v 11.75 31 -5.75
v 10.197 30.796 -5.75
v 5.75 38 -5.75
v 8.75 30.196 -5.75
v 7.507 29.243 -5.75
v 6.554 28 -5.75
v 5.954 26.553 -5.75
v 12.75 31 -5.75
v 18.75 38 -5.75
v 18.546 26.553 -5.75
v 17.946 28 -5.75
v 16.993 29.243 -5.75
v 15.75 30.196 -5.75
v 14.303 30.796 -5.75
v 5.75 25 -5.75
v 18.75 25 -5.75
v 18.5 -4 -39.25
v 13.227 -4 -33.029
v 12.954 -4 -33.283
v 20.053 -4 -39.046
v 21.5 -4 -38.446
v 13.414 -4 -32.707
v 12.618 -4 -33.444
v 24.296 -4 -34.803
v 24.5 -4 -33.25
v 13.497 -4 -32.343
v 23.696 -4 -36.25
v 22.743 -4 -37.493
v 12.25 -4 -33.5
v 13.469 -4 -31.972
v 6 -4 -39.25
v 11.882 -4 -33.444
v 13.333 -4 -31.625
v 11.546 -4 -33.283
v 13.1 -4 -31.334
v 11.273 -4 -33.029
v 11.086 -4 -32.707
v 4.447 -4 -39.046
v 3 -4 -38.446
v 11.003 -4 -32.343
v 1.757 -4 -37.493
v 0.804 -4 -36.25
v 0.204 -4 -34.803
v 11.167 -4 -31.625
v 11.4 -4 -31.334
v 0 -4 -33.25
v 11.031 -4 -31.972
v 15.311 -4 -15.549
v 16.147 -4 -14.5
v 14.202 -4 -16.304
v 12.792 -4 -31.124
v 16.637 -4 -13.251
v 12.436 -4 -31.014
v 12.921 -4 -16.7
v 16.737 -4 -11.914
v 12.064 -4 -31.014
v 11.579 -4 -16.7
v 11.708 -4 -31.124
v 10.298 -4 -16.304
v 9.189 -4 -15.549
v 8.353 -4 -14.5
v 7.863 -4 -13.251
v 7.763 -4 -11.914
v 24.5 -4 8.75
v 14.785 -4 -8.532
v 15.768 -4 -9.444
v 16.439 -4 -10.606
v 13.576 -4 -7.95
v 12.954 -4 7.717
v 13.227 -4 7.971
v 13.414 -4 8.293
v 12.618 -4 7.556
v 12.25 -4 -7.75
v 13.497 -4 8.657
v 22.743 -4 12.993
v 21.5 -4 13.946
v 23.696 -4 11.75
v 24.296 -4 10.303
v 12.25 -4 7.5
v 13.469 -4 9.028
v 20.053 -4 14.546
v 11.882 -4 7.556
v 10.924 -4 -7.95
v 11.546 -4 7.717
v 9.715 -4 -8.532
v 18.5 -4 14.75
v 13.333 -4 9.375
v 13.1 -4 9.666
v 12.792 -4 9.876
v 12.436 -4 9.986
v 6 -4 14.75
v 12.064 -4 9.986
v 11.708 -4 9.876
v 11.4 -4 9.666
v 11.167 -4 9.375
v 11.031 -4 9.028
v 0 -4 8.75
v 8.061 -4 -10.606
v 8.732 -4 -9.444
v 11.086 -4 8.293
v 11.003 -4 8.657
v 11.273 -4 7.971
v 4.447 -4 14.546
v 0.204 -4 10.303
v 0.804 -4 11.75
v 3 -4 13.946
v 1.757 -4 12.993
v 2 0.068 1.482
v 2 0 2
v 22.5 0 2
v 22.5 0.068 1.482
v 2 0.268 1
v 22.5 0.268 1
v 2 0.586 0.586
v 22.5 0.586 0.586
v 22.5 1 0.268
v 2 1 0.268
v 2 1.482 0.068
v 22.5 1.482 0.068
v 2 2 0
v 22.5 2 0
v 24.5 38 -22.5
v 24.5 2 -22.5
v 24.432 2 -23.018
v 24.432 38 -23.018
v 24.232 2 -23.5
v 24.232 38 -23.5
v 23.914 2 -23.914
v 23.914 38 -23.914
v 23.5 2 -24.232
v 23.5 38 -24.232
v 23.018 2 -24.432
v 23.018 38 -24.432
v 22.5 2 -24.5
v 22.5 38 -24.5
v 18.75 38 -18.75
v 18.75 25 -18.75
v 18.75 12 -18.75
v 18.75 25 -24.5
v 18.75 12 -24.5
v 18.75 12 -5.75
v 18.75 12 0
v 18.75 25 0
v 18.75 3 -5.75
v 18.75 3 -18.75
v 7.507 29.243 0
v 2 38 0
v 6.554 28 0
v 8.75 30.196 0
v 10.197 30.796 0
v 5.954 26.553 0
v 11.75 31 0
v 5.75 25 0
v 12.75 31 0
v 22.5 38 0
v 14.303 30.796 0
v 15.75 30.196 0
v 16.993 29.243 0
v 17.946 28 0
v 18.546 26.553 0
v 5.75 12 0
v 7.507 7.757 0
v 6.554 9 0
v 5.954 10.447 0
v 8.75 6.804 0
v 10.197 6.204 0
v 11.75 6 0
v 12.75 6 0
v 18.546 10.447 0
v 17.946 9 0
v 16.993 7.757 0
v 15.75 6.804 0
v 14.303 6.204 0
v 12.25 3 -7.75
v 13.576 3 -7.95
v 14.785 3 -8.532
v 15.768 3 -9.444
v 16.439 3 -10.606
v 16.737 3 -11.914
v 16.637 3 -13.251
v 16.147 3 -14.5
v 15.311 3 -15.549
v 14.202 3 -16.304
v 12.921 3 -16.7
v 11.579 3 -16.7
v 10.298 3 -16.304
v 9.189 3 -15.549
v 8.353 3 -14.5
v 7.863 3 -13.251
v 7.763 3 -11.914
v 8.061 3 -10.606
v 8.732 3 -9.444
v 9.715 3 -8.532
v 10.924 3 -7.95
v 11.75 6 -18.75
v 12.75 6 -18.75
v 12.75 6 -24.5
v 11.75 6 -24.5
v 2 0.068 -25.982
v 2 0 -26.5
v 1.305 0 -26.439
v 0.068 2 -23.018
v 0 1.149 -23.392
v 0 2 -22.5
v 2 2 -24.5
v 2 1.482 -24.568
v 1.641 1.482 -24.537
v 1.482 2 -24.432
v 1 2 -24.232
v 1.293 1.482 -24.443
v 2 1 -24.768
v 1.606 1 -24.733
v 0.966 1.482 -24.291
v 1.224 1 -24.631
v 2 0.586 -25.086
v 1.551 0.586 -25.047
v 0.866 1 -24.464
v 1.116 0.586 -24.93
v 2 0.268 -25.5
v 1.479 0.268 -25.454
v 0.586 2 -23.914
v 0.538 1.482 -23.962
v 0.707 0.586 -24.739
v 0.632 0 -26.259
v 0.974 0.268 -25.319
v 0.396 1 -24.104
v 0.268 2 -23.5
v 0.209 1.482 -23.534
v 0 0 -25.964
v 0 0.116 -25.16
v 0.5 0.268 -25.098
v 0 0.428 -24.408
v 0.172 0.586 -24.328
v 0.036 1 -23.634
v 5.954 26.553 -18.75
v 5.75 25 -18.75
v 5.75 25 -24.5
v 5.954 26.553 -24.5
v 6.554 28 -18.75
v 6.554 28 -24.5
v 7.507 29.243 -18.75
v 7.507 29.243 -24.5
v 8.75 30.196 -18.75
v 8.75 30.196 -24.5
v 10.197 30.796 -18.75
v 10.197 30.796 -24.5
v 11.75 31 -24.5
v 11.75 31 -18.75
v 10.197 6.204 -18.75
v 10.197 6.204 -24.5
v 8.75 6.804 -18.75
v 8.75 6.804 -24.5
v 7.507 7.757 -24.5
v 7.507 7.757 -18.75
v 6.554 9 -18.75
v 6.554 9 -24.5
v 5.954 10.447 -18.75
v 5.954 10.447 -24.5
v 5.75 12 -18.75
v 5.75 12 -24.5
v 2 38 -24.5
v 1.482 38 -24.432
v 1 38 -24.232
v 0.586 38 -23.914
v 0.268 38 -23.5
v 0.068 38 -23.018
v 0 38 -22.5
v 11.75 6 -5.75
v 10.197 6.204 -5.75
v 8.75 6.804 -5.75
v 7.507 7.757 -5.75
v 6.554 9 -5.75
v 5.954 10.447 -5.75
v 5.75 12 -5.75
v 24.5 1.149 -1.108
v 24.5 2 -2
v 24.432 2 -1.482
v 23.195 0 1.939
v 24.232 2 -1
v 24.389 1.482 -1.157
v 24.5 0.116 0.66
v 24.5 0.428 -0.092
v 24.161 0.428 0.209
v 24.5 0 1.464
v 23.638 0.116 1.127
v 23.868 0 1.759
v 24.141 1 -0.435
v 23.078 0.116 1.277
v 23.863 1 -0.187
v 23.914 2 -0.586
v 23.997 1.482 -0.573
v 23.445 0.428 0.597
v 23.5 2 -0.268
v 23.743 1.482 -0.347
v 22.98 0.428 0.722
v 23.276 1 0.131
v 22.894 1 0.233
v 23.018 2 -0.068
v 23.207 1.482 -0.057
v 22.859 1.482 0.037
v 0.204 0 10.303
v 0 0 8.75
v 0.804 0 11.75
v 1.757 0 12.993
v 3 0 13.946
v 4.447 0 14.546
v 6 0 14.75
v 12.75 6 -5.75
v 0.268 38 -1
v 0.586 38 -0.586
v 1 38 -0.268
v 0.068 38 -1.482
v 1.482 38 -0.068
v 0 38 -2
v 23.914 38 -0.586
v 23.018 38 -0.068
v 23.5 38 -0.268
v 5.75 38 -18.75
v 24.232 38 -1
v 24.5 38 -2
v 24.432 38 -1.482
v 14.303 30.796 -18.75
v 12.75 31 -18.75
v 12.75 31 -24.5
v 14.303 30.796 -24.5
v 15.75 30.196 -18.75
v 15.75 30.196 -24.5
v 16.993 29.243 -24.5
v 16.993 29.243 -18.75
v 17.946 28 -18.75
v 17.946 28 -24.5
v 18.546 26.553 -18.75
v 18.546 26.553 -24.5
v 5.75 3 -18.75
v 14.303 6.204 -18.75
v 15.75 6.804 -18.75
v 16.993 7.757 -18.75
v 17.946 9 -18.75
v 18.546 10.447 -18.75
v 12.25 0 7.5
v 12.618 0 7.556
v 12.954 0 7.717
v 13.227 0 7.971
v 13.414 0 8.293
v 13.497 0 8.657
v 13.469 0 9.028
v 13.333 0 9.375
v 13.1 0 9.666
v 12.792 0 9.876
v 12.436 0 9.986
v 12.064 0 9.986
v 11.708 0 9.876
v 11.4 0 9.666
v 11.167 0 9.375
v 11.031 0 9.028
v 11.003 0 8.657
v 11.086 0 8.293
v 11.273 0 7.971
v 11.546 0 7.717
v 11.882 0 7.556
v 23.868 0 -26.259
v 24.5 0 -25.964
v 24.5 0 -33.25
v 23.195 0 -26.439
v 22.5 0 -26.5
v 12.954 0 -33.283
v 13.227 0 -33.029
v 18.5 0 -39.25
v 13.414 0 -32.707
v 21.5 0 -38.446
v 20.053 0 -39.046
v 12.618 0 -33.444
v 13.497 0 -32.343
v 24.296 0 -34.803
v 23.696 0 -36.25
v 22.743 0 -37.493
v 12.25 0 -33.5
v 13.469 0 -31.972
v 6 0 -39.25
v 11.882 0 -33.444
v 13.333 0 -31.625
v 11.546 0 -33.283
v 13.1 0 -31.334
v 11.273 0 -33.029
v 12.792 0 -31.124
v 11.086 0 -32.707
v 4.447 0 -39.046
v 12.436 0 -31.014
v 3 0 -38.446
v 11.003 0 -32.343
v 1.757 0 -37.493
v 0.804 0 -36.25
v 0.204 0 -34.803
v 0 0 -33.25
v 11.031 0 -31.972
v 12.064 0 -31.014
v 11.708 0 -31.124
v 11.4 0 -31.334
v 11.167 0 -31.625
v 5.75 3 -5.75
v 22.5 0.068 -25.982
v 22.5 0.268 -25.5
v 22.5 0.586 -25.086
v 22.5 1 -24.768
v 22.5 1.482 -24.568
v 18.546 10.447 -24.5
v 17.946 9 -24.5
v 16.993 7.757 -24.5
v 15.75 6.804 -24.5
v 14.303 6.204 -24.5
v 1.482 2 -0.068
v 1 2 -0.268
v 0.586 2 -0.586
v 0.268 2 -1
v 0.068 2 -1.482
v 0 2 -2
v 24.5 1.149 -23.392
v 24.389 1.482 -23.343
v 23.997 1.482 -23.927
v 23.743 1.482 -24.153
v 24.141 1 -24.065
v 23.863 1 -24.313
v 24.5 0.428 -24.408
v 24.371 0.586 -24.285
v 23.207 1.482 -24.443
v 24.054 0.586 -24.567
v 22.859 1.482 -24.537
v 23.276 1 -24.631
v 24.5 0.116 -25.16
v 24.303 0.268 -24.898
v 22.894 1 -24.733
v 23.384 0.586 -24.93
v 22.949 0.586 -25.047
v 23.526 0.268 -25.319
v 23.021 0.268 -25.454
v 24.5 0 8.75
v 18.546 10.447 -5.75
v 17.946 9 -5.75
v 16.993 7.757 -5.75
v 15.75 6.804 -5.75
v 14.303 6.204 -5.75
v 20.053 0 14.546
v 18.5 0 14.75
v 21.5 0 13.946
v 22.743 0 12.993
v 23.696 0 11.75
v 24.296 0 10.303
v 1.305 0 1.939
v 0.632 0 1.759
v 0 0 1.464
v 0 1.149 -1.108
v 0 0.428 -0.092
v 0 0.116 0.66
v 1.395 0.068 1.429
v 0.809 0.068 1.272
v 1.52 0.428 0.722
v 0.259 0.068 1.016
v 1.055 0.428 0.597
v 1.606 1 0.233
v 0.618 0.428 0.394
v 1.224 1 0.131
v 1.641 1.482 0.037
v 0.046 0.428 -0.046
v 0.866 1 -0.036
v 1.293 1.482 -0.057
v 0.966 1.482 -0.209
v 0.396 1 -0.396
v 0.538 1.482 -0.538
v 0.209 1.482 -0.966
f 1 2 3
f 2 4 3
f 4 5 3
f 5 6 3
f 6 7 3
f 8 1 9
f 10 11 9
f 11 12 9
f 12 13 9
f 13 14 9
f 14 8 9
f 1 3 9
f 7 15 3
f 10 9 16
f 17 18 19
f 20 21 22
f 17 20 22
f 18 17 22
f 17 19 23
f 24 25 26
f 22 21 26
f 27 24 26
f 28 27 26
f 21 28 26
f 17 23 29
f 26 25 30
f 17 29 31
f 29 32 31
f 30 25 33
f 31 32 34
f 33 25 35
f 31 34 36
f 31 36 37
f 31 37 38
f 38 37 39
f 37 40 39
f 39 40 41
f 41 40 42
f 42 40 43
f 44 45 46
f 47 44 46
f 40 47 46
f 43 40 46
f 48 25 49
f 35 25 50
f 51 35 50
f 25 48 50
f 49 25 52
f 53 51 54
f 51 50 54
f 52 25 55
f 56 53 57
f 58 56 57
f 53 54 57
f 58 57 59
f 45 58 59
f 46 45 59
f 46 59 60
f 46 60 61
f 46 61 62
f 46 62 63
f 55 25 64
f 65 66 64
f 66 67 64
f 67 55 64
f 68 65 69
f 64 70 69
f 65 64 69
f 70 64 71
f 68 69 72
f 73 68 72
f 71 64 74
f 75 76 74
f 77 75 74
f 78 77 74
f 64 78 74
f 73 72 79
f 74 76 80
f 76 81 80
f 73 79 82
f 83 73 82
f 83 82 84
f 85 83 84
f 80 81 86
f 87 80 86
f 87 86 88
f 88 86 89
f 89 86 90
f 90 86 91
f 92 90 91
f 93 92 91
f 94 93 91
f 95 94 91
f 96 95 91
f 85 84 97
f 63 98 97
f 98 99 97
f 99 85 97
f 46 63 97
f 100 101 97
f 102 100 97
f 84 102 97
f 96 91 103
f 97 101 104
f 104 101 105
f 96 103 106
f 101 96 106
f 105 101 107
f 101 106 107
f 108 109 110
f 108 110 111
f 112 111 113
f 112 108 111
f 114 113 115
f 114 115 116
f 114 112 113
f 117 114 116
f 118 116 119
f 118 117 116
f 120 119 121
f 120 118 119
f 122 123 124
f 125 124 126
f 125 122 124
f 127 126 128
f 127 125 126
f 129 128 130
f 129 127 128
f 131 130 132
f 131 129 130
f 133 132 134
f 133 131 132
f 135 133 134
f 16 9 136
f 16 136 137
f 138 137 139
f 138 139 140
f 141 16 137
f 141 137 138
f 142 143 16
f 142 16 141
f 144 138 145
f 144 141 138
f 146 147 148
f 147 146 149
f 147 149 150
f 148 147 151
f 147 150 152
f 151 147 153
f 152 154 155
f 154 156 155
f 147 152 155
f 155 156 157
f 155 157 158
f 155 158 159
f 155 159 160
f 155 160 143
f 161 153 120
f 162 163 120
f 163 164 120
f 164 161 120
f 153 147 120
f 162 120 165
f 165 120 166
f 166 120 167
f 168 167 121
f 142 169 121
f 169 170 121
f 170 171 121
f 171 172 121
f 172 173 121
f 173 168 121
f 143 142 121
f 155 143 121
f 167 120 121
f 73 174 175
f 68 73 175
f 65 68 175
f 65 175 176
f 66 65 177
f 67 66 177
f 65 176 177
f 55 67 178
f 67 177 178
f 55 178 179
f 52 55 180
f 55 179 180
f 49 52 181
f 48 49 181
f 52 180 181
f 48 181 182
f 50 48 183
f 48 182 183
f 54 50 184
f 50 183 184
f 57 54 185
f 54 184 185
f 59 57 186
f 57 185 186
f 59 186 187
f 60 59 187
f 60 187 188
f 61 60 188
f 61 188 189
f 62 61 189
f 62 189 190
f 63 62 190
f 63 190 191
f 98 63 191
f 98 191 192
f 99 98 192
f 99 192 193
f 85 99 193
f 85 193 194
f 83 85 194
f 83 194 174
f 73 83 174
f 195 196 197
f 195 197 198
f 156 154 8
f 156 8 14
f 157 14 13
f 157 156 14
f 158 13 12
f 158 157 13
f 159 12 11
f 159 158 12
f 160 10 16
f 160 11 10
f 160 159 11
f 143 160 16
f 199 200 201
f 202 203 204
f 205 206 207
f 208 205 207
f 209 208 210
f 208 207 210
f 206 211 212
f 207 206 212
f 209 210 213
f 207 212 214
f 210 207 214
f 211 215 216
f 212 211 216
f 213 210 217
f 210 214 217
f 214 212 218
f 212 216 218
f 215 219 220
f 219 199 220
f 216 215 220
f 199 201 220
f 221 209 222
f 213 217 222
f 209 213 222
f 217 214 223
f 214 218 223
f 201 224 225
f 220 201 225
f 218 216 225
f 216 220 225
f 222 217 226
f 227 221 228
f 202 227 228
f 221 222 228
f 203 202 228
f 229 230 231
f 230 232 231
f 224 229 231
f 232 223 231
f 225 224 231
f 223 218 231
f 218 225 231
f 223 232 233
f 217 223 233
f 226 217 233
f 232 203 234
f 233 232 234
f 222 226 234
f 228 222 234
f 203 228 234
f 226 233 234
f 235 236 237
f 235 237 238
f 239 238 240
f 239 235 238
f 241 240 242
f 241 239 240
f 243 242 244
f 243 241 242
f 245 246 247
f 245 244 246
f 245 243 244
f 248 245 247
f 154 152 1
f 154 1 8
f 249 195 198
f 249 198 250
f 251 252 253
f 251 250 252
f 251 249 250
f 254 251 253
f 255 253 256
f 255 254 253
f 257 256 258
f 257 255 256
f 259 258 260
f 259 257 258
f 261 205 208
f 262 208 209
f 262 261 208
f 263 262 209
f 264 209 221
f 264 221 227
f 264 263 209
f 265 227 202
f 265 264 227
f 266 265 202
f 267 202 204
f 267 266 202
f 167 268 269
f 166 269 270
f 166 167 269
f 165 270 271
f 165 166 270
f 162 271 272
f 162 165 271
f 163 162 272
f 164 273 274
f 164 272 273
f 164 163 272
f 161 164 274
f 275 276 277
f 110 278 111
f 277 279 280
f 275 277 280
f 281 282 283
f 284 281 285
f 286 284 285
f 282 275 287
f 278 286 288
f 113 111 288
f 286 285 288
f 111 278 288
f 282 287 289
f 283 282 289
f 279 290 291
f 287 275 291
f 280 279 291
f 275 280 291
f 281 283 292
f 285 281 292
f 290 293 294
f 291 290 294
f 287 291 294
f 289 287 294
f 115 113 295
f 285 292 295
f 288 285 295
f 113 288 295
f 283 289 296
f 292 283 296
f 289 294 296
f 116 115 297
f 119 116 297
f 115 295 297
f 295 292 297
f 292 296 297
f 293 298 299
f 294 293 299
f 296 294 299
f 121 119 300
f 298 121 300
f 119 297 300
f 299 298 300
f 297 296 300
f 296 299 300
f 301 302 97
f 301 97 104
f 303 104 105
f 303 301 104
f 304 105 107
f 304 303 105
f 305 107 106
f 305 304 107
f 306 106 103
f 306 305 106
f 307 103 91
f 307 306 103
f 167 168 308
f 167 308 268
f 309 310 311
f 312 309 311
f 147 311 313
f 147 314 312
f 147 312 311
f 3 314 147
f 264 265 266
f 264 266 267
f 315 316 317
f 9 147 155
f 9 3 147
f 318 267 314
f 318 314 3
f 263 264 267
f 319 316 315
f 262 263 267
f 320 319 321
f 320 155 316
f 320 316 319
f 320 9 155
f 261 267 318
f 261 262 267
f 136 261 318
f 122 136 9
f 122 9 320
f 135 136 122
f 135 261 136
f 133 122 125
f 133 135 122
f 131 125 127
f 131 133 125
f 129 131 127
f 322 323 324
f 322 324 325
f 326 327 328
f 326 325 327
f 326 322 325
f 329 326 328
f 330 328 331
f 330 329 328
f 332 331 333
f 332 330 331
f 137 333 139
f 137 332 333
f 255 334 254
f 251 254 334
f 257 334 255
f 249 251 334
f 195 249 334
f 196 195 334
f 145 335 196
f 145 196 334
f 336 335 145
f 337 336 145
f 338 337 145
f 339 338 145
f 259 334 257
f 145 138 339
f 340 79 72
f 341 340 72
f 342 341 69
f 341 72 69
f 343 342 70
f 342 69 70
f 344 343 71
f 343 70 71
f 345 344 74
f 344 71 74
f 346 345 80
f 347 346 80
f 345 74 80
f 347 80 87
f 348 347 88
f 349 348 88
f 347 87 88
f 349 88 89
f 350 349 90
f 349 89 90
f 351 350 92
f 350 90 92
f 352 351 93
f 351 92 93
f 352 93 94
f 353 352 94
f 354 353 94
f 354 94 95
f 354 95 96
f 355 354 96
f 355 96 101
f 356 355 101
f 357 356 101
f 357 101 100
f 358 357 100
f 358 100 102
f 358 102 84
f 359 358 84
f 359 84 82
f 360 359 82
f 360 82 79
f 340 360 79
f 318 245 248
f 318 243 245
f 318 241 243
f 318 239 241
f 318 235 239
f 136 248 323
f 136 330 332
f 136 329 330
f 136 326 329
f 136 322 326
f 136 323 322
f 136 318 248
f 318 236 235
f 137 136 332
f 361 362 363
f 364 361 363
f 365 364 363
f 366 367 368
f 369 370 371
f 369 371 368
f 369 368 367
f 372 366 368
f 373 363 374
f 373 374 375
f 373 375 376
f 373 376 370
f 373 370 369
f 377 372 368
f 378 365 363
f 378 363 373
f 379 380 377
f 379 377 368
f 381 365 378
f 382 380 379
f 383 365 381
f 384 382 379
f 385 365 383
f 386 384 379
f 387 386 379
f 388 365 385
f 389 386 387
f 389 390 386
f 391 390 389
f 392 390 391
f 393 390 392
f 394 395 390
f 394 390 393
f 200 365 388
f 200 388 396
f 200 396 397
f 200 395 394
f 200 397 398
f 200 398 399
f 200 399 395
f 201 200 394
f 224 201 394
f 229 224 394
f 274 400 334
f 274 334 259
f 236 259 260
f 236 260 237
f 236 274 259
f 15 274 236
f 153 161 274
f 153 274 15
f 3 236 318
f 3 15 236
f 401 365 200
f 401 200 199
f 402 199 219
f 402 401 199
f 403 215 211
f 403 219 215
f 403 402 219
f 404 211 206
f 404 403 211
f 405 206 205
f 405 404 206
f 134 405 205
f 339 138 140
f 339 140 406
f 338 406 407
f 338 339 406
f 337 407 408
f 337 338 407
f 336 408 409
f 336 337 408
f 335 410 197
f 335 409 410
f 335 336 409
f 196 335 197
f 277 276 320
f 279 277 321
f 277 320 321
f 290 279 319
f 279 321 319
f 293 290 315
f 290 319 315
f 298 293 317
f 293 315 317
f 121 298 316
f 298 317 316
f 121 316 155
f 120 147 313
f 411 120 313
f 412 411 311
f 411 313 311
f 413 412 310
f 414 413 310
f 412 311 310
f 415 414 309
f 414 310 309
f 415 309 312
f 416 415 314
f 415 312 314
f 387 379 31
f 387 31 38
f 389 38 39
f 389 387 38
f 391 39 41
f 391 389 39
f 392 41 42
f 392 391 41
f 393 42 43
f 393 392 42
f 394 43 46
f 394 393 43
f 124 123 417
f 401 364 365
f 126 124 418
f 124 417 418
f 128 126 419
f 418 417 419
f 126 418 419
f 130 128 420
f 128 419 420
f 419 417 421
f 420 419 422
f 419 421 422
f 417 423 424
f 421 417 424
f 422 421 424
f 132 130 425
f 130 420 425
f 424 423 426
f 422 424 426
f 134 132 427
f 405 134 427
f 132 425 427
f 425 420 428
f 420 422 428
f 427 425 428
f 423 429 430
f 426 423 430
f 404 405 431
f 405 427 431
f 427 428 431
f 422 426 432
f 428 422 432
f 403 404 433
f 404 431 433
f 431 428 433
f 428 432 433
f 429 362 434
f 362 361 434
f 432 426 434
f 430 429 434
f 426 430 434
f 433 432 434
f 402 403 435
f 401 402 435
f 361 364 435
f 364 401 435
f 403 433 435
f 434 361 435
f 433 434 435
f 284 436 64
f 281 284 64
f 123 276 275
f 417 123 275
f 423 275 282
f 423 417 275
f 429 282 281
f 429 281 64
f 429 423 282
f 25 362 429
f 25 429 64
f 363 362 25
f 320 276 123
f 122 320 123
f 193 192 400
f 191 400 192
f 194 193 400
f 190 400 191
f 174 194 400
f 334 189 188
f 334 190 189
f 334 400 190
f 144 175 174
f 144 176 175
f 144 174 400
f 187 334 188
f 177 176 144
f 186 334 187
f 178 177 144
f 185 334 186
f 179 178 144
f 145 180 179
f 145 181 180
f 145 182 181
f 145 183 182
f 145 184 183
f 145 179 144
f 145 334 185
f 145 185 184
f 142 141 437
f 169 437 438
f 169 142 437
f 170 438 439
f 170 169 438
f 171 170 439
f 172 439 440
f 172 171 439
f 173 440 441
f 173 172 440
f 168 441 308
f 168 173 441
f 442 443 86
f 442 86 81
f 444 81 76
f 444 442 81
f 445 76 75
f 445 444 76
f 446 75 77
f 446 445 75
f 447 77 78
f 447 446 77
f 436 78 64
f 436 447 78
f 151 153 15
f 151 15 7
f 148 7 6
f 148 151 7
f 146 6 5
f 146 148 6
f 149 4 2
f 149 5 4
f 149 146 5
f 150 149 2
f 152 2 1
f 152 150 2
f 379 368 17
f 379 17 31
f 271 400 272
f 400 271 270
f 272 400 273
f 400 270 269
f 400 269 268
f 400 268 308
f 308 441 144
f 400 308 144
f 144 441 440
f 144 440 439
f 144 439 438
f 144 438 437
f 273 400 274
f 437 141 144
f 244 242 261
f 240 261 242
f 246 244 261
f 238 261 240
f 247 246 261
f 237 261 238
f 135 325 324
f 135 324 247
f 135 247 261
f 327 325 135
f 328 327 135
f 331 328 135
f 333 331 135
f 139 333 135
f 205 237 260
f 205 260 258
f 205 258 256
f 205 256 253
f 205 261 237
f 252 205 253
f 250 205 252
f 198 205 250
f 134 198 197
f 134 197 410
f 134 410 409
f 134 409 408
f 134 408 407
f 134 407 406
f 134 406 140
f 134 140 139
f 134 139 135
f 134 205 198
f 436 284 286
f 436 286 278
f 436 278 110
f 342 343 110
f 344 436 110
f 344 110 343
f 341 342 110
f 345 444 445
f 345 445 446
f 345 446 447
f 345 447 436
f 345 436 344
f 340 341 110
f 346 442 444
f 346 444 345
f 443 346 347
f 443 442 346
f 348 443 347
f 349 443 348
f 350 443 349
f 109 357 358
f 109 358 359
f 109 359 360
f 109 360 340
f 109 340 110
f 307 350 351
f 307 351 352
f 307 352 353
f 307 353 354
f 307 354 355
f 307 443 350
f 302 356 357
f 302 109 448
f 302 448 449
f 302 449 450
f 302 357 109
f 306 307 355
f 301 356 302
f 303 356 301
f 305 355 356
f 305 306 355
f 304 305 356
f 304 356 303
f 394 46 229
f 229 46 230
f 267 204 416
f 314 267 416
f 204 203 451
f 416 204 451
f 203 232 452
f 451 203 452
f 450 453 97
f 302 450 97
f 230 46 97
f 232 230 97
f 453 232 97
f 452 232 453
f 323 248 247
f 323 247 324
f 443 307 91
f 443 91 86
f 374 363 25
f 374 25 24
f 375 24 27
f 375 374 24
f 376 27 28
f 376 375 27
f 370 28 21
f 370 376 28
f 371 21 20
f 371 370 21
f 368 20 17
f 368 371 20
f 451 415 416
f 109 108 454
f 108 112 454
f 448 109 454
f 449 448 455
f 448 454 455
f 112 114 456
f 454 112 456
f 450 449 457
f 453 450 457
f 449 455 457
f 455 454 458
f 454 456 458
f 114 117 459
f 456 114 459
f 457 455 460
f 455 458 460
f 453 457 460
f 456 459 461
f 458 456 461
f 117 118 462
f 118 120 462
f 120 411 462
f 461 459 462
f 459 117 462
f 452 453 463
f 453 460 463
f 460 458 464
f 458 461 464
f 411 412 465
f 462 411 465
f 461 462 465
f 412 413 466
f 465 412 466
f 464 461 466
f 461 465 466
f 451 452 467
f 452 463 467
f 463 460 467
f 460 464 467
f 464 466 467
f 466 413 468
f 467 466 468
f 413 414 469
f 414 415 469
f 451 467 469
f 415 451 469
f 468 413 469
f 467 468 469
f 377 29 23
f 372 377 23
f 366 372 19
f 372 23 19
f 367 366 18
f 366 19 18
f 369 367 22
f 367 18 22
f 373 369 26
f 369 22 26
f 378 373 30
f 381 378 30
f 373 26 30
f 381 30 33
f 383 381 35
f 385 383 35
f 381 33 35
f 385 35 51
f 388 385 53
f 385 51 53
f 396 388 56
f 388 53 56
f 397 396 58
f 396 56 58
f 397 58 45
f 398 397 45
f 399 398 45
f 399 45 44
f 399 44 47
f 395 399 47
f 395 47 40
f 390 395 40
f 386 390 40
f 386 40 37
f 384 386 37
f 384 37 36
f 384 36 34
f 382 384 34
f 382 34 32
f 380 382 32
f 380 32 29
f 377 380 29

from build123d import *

# Parameters (mm, degrees)
SKETCH_1_W          = 24.5
SKETCH_1_H          = 24.5
EXTRUDE_1_DEPTH     = 38
EXTRUDE_2_DEPTH     = 4
SKETCH_3_W          = 13
SKETCH_3_H          = 13
CUT_EXTRUDE_1_DEPTH = 35
SKETCH_4_R          = 4.5
CUT_EXTRUDE_2_DEPTH = 59.015622896
CUT_EXTRUDE_3_DEPTH = 60.873303734
FILLET_1_R          = 2
SKETCH_6_R          = 1.25
CUT_EXTRUDE_4_DEPTH = 63.488498942
FILLET_2_R          = 2


with BuildPart() as part:
    # Эскиз1 → Бобышка-Вытянуть1 (new body)
    with BuildSketch(Plane(origin=(0, 0, 0), x_dir=(1, 0, 0), z_dir=(0, 1, 0))):
        with Locations((12.25, 12.25)):
            Rectangle(SKETCH_1_W, SKETCH_1_H)
    extrude(amount=EXTRUDE_1_DEPTH)

    # Эскиз2 → Бобышка-Вытянуть2 (add)
    with BuildSketch(Plane.XZ):
        with BuildLine():
            Line((24.5, -24.5), (24.5, -33.25))
            ThreePointArc((24.5, -33.25), (22.742640687, -37.492640687), (18.5, -39.25))
            Line((18.5, -39.25), (6, -39.25))
            ThreePointArc((6, -39.25), (1.757359313, -37.492640687), (0, -33.25))
            Line((0, -33.25), (0, -24.5))
            Line((0, -24.5), (0, 0))
            Line((0, 0), (0, 8.75))
            ThreePointArc((0, 8.75), (1.757359313, 12.992640687), (6, 14.75))
            Line((6, 14.75), (18.5, 14.75))
            ThreePointArc((18.5, 14.75), (22.742640687, 12.992640687), (24.5, 8.75))
            Line((24.5, 8.75), (24.5, 0))
            Line((24.5, 0), (24.5, -24.5))
        make_face()
    extrude(amount=EXTRUDE_2_DEPTH)

    # Эскиз3 → Вырез-Вытянуть1 (cut)
    with BuildSketch(Plane(origin=(0, 38, 0), x_dir=(1, 0, 0), z_dir=(0, 1, 0))):
        with Locations((12.25, 12.25)):
            Rectangle(SKETCH_3_W, SKETCH_3_H)
    extrude(amount=-CUT_EXTRUDE_1_DEPTH, mode=Mode.SUBTRACT)

    # Эскиз4 → Вырез-Вытянуть2 (cut, through all)
    with BuildSketch(Plane(origin=(0, 3, 0), x_dir=(1, 0, 0), z_dir=(0, 1, 0))):
        with Locations(Location((12.25, 12.25, 0), (0, 0, 270))):
            Circle(SKETCH_4_R)
    extrude(amount=-CUT_EXTRUDE_2_DEPTH, mode=Mode.SUBTRACT)

    # Эскиз5 → Вырез-Вытянуть3 (cut, through all)
    with BuildSketch(Plane.XY):
        with BuildLine():
            Line((11.75, 31), (12.75, 31))
            ThreePointArc((12.75, 31), (16.992640687, 29.242640687), (18.75, 25))
            Line((18.75, 25), (18.75, 12))
            ThreePointArc((18.75, 12), (16.992640687, 7.757359313), (12.75, 6))
            Line((12.75, 6), (11.75, 6))
            ThreePointArc((11.75, 6), (7.507359313, 7.757359313), (5.75, 12))
            Line((5.75, 12), (5.75, 25))
            ThreePointArc((5.75, 25), (7.507359313, 29.242640687), (11.75, 31))
        make_face()
    extrude(amount=-CUT_EXTRUDE_3_DEPTH, mode=Mode.SUBTRACT)

    # Скругление1
    fillet_1_edges = [part.edges().sort_by_distance(p)[0] for p in [
        (0, 19, -24.5),
        (0, 19, 0),
        (24.5, 19, -24.5),
        (24.5, 19, 0),
    ]]
    fillet(fillet_1_edges, radius=FILLET_1_R)

    # Эскиз6 → Вырез-Вытянуть4 (cut, through all)
    with BuildSketch(Plane.XZ.offset(4)):
        with Locations(Location((12.25, 8.75, 0), (0, 0, 270))):
            Circle(SKETCH_6_R)
        with Locations(Location((12.25, -32.25, 0), (0, 0, 270))):
            Circle(SKETCH_6_R)
    extrude(amount=-CUT_EXTRUDE_4_DEPTH, mode=Mode.SUBTRACT)

    # Скругление2
    # the kernel refuses this fillet: 2 mm, written as the material it adds along each edge
    with BuildSketch(Plane(origin=(22.5, 0, -22.5), x_dir=(-0.8017442392976493, 0, 0.5976672776328263), z_dir=(-0.5976672776328263, 0, -0.8017442392976493))) as fillet_2_piece_1_section:
        with BuildLine():
            CenterArc((2 + FILLET_2_R, FILLET_2_R), FILLET_2_R, 180, 90)
            Line((2, FILLET_2_R), (2, 0))
            Line((2, 0), (2 + FILLET_2_R, 0))
        make_face()
    fillet_2_piece_1 = revolve(axis=Axis((22.5, 0, -22.5), (0, 1, 0)), revolution_arc=233.296989237, mode=Mode.PRIVATE)
    fillet_2_piece_1 = split(fillet_2_piece_1, bisect_by=Plane(origin=(24.5, 0.623256616, -23.99987789), z_dir=(-1, 0, 0)), keep=Keep.TOP, mode=Mode.PRIVATE)
    add(fillet_2_piece_1)
    with BuildSketch(Plane(origin=(2, 0, -22.5), x_dir=(0, 0, -1), z_dir=(1, 0, 0))) as fillet_2_piece_2_section:
        with BuildLine():
            CenterArc((2 + FILLET_2_R, FILLET_2_R), FILLET_2_R, 180, 90)
            Line((2, FILLET_2_R), (2, 0))
            Line((2, 0), (2 + FILLET_2_R, 0))
        make_face()
    fillet_2_piece_2 = revolve(axis=Axis((2, 0, -22.5), (0, 1, 0)), revolution_arc=233.296989237, mode=Mode.PRIVATE)
    fillet_2_piece_2 = split(fillet_2_piece_2, bisect_by=Plane(origin=(0, 0.334600406, -24.939550499), z_dir=(1, 0, 0)), keep=Keep.TOP, mode=Mode.PRIVATE)
    add(fillet_2_piece_2)
    with BuildSketch(Plane(origin=(2, 0, -2), x_dir=(0, 0, 1), z_dir=(1, 0, 0))) as fillet_2_piece_3_section:
        with BuildLine():
            CenterArc((2 + FILLET_2_R, -FILLET_2_R), FILLET_2_R, 90, 90)
            Line((2, -FILLET_2_R), (2, 0))
            Line((2, 0), (2 + FILLET_2_R, 0))
        make_face()
    fillet_2_piece_3 = revolve(axis=Axis((2, 0, -2), (0, -1, 0)), revolution_arc=233.296989237, mode=Mode.PRIVATE)
    fillet_2_piece_3 = split(fillet_2_piece_3, bisect_by=Plane(origin=(0, 0.334600403, 0.439550497), z_dir=(1, 0, 0)), keep=Keep.TOP, mode=Mode.PRIVATE)
    add(fillet_2_piece_3)
    with BuildSketch(Plane(origin=(22.5, 0, -2), x_dir=(-0.801744239297648, 0, -0.5976672776328278), z_dir=(-0.5976672776328278, 0, 0.801744239297648))) as fillet_2_piece_4_section:
        with BuildLine():
            CenterArc((2 + FILLET_2_R, -FILLET_2_R), FILLET_2_R, 90, 90)
            Line((2 + FILLET_2_R, 0), (2, 0))
            Line((2, 0), (2, -FILLET_2_R))
        make_face()
    fillet_2_piece_4 = revolve(axis=Axis((22.5, 0, -2), (0, -1, 0)), revolution_arc=233.296989237, mode=Mode.PRIVATE)
    fillet_2_piece_4 = split(fillet_2_piece_4, bisect_by=Plane(origin=(24.5, 0.623256909, -0.500122227), z_dir=(-1, 0, 0)), keep=Keep.TOP, mode=Mode.PRIVATE)
    add(fillet_2_piece_4)
    with BuildSketch(Plane(origin=(22.5, 0, -24.5), x_dir=(0, 0, -1), z_dir=(-1, 0, 0)), Plane(origin=(2, 0, 0), x_dir=(0, 0, 1), z_dir=(1, 0, 0))) as fillet_2_piece_5:
        with BuildLine():
            CenterArc((FILLET_2_R, -FILLET_2_R), FILLET_2_R, 90, 90)
            Line((0, -FILLET_2_R), (0, 0))
            Line((0, 0), (FILLET_2_R, 0))
        make_face()
    extrude(amount=20.5)


solid = part.part
